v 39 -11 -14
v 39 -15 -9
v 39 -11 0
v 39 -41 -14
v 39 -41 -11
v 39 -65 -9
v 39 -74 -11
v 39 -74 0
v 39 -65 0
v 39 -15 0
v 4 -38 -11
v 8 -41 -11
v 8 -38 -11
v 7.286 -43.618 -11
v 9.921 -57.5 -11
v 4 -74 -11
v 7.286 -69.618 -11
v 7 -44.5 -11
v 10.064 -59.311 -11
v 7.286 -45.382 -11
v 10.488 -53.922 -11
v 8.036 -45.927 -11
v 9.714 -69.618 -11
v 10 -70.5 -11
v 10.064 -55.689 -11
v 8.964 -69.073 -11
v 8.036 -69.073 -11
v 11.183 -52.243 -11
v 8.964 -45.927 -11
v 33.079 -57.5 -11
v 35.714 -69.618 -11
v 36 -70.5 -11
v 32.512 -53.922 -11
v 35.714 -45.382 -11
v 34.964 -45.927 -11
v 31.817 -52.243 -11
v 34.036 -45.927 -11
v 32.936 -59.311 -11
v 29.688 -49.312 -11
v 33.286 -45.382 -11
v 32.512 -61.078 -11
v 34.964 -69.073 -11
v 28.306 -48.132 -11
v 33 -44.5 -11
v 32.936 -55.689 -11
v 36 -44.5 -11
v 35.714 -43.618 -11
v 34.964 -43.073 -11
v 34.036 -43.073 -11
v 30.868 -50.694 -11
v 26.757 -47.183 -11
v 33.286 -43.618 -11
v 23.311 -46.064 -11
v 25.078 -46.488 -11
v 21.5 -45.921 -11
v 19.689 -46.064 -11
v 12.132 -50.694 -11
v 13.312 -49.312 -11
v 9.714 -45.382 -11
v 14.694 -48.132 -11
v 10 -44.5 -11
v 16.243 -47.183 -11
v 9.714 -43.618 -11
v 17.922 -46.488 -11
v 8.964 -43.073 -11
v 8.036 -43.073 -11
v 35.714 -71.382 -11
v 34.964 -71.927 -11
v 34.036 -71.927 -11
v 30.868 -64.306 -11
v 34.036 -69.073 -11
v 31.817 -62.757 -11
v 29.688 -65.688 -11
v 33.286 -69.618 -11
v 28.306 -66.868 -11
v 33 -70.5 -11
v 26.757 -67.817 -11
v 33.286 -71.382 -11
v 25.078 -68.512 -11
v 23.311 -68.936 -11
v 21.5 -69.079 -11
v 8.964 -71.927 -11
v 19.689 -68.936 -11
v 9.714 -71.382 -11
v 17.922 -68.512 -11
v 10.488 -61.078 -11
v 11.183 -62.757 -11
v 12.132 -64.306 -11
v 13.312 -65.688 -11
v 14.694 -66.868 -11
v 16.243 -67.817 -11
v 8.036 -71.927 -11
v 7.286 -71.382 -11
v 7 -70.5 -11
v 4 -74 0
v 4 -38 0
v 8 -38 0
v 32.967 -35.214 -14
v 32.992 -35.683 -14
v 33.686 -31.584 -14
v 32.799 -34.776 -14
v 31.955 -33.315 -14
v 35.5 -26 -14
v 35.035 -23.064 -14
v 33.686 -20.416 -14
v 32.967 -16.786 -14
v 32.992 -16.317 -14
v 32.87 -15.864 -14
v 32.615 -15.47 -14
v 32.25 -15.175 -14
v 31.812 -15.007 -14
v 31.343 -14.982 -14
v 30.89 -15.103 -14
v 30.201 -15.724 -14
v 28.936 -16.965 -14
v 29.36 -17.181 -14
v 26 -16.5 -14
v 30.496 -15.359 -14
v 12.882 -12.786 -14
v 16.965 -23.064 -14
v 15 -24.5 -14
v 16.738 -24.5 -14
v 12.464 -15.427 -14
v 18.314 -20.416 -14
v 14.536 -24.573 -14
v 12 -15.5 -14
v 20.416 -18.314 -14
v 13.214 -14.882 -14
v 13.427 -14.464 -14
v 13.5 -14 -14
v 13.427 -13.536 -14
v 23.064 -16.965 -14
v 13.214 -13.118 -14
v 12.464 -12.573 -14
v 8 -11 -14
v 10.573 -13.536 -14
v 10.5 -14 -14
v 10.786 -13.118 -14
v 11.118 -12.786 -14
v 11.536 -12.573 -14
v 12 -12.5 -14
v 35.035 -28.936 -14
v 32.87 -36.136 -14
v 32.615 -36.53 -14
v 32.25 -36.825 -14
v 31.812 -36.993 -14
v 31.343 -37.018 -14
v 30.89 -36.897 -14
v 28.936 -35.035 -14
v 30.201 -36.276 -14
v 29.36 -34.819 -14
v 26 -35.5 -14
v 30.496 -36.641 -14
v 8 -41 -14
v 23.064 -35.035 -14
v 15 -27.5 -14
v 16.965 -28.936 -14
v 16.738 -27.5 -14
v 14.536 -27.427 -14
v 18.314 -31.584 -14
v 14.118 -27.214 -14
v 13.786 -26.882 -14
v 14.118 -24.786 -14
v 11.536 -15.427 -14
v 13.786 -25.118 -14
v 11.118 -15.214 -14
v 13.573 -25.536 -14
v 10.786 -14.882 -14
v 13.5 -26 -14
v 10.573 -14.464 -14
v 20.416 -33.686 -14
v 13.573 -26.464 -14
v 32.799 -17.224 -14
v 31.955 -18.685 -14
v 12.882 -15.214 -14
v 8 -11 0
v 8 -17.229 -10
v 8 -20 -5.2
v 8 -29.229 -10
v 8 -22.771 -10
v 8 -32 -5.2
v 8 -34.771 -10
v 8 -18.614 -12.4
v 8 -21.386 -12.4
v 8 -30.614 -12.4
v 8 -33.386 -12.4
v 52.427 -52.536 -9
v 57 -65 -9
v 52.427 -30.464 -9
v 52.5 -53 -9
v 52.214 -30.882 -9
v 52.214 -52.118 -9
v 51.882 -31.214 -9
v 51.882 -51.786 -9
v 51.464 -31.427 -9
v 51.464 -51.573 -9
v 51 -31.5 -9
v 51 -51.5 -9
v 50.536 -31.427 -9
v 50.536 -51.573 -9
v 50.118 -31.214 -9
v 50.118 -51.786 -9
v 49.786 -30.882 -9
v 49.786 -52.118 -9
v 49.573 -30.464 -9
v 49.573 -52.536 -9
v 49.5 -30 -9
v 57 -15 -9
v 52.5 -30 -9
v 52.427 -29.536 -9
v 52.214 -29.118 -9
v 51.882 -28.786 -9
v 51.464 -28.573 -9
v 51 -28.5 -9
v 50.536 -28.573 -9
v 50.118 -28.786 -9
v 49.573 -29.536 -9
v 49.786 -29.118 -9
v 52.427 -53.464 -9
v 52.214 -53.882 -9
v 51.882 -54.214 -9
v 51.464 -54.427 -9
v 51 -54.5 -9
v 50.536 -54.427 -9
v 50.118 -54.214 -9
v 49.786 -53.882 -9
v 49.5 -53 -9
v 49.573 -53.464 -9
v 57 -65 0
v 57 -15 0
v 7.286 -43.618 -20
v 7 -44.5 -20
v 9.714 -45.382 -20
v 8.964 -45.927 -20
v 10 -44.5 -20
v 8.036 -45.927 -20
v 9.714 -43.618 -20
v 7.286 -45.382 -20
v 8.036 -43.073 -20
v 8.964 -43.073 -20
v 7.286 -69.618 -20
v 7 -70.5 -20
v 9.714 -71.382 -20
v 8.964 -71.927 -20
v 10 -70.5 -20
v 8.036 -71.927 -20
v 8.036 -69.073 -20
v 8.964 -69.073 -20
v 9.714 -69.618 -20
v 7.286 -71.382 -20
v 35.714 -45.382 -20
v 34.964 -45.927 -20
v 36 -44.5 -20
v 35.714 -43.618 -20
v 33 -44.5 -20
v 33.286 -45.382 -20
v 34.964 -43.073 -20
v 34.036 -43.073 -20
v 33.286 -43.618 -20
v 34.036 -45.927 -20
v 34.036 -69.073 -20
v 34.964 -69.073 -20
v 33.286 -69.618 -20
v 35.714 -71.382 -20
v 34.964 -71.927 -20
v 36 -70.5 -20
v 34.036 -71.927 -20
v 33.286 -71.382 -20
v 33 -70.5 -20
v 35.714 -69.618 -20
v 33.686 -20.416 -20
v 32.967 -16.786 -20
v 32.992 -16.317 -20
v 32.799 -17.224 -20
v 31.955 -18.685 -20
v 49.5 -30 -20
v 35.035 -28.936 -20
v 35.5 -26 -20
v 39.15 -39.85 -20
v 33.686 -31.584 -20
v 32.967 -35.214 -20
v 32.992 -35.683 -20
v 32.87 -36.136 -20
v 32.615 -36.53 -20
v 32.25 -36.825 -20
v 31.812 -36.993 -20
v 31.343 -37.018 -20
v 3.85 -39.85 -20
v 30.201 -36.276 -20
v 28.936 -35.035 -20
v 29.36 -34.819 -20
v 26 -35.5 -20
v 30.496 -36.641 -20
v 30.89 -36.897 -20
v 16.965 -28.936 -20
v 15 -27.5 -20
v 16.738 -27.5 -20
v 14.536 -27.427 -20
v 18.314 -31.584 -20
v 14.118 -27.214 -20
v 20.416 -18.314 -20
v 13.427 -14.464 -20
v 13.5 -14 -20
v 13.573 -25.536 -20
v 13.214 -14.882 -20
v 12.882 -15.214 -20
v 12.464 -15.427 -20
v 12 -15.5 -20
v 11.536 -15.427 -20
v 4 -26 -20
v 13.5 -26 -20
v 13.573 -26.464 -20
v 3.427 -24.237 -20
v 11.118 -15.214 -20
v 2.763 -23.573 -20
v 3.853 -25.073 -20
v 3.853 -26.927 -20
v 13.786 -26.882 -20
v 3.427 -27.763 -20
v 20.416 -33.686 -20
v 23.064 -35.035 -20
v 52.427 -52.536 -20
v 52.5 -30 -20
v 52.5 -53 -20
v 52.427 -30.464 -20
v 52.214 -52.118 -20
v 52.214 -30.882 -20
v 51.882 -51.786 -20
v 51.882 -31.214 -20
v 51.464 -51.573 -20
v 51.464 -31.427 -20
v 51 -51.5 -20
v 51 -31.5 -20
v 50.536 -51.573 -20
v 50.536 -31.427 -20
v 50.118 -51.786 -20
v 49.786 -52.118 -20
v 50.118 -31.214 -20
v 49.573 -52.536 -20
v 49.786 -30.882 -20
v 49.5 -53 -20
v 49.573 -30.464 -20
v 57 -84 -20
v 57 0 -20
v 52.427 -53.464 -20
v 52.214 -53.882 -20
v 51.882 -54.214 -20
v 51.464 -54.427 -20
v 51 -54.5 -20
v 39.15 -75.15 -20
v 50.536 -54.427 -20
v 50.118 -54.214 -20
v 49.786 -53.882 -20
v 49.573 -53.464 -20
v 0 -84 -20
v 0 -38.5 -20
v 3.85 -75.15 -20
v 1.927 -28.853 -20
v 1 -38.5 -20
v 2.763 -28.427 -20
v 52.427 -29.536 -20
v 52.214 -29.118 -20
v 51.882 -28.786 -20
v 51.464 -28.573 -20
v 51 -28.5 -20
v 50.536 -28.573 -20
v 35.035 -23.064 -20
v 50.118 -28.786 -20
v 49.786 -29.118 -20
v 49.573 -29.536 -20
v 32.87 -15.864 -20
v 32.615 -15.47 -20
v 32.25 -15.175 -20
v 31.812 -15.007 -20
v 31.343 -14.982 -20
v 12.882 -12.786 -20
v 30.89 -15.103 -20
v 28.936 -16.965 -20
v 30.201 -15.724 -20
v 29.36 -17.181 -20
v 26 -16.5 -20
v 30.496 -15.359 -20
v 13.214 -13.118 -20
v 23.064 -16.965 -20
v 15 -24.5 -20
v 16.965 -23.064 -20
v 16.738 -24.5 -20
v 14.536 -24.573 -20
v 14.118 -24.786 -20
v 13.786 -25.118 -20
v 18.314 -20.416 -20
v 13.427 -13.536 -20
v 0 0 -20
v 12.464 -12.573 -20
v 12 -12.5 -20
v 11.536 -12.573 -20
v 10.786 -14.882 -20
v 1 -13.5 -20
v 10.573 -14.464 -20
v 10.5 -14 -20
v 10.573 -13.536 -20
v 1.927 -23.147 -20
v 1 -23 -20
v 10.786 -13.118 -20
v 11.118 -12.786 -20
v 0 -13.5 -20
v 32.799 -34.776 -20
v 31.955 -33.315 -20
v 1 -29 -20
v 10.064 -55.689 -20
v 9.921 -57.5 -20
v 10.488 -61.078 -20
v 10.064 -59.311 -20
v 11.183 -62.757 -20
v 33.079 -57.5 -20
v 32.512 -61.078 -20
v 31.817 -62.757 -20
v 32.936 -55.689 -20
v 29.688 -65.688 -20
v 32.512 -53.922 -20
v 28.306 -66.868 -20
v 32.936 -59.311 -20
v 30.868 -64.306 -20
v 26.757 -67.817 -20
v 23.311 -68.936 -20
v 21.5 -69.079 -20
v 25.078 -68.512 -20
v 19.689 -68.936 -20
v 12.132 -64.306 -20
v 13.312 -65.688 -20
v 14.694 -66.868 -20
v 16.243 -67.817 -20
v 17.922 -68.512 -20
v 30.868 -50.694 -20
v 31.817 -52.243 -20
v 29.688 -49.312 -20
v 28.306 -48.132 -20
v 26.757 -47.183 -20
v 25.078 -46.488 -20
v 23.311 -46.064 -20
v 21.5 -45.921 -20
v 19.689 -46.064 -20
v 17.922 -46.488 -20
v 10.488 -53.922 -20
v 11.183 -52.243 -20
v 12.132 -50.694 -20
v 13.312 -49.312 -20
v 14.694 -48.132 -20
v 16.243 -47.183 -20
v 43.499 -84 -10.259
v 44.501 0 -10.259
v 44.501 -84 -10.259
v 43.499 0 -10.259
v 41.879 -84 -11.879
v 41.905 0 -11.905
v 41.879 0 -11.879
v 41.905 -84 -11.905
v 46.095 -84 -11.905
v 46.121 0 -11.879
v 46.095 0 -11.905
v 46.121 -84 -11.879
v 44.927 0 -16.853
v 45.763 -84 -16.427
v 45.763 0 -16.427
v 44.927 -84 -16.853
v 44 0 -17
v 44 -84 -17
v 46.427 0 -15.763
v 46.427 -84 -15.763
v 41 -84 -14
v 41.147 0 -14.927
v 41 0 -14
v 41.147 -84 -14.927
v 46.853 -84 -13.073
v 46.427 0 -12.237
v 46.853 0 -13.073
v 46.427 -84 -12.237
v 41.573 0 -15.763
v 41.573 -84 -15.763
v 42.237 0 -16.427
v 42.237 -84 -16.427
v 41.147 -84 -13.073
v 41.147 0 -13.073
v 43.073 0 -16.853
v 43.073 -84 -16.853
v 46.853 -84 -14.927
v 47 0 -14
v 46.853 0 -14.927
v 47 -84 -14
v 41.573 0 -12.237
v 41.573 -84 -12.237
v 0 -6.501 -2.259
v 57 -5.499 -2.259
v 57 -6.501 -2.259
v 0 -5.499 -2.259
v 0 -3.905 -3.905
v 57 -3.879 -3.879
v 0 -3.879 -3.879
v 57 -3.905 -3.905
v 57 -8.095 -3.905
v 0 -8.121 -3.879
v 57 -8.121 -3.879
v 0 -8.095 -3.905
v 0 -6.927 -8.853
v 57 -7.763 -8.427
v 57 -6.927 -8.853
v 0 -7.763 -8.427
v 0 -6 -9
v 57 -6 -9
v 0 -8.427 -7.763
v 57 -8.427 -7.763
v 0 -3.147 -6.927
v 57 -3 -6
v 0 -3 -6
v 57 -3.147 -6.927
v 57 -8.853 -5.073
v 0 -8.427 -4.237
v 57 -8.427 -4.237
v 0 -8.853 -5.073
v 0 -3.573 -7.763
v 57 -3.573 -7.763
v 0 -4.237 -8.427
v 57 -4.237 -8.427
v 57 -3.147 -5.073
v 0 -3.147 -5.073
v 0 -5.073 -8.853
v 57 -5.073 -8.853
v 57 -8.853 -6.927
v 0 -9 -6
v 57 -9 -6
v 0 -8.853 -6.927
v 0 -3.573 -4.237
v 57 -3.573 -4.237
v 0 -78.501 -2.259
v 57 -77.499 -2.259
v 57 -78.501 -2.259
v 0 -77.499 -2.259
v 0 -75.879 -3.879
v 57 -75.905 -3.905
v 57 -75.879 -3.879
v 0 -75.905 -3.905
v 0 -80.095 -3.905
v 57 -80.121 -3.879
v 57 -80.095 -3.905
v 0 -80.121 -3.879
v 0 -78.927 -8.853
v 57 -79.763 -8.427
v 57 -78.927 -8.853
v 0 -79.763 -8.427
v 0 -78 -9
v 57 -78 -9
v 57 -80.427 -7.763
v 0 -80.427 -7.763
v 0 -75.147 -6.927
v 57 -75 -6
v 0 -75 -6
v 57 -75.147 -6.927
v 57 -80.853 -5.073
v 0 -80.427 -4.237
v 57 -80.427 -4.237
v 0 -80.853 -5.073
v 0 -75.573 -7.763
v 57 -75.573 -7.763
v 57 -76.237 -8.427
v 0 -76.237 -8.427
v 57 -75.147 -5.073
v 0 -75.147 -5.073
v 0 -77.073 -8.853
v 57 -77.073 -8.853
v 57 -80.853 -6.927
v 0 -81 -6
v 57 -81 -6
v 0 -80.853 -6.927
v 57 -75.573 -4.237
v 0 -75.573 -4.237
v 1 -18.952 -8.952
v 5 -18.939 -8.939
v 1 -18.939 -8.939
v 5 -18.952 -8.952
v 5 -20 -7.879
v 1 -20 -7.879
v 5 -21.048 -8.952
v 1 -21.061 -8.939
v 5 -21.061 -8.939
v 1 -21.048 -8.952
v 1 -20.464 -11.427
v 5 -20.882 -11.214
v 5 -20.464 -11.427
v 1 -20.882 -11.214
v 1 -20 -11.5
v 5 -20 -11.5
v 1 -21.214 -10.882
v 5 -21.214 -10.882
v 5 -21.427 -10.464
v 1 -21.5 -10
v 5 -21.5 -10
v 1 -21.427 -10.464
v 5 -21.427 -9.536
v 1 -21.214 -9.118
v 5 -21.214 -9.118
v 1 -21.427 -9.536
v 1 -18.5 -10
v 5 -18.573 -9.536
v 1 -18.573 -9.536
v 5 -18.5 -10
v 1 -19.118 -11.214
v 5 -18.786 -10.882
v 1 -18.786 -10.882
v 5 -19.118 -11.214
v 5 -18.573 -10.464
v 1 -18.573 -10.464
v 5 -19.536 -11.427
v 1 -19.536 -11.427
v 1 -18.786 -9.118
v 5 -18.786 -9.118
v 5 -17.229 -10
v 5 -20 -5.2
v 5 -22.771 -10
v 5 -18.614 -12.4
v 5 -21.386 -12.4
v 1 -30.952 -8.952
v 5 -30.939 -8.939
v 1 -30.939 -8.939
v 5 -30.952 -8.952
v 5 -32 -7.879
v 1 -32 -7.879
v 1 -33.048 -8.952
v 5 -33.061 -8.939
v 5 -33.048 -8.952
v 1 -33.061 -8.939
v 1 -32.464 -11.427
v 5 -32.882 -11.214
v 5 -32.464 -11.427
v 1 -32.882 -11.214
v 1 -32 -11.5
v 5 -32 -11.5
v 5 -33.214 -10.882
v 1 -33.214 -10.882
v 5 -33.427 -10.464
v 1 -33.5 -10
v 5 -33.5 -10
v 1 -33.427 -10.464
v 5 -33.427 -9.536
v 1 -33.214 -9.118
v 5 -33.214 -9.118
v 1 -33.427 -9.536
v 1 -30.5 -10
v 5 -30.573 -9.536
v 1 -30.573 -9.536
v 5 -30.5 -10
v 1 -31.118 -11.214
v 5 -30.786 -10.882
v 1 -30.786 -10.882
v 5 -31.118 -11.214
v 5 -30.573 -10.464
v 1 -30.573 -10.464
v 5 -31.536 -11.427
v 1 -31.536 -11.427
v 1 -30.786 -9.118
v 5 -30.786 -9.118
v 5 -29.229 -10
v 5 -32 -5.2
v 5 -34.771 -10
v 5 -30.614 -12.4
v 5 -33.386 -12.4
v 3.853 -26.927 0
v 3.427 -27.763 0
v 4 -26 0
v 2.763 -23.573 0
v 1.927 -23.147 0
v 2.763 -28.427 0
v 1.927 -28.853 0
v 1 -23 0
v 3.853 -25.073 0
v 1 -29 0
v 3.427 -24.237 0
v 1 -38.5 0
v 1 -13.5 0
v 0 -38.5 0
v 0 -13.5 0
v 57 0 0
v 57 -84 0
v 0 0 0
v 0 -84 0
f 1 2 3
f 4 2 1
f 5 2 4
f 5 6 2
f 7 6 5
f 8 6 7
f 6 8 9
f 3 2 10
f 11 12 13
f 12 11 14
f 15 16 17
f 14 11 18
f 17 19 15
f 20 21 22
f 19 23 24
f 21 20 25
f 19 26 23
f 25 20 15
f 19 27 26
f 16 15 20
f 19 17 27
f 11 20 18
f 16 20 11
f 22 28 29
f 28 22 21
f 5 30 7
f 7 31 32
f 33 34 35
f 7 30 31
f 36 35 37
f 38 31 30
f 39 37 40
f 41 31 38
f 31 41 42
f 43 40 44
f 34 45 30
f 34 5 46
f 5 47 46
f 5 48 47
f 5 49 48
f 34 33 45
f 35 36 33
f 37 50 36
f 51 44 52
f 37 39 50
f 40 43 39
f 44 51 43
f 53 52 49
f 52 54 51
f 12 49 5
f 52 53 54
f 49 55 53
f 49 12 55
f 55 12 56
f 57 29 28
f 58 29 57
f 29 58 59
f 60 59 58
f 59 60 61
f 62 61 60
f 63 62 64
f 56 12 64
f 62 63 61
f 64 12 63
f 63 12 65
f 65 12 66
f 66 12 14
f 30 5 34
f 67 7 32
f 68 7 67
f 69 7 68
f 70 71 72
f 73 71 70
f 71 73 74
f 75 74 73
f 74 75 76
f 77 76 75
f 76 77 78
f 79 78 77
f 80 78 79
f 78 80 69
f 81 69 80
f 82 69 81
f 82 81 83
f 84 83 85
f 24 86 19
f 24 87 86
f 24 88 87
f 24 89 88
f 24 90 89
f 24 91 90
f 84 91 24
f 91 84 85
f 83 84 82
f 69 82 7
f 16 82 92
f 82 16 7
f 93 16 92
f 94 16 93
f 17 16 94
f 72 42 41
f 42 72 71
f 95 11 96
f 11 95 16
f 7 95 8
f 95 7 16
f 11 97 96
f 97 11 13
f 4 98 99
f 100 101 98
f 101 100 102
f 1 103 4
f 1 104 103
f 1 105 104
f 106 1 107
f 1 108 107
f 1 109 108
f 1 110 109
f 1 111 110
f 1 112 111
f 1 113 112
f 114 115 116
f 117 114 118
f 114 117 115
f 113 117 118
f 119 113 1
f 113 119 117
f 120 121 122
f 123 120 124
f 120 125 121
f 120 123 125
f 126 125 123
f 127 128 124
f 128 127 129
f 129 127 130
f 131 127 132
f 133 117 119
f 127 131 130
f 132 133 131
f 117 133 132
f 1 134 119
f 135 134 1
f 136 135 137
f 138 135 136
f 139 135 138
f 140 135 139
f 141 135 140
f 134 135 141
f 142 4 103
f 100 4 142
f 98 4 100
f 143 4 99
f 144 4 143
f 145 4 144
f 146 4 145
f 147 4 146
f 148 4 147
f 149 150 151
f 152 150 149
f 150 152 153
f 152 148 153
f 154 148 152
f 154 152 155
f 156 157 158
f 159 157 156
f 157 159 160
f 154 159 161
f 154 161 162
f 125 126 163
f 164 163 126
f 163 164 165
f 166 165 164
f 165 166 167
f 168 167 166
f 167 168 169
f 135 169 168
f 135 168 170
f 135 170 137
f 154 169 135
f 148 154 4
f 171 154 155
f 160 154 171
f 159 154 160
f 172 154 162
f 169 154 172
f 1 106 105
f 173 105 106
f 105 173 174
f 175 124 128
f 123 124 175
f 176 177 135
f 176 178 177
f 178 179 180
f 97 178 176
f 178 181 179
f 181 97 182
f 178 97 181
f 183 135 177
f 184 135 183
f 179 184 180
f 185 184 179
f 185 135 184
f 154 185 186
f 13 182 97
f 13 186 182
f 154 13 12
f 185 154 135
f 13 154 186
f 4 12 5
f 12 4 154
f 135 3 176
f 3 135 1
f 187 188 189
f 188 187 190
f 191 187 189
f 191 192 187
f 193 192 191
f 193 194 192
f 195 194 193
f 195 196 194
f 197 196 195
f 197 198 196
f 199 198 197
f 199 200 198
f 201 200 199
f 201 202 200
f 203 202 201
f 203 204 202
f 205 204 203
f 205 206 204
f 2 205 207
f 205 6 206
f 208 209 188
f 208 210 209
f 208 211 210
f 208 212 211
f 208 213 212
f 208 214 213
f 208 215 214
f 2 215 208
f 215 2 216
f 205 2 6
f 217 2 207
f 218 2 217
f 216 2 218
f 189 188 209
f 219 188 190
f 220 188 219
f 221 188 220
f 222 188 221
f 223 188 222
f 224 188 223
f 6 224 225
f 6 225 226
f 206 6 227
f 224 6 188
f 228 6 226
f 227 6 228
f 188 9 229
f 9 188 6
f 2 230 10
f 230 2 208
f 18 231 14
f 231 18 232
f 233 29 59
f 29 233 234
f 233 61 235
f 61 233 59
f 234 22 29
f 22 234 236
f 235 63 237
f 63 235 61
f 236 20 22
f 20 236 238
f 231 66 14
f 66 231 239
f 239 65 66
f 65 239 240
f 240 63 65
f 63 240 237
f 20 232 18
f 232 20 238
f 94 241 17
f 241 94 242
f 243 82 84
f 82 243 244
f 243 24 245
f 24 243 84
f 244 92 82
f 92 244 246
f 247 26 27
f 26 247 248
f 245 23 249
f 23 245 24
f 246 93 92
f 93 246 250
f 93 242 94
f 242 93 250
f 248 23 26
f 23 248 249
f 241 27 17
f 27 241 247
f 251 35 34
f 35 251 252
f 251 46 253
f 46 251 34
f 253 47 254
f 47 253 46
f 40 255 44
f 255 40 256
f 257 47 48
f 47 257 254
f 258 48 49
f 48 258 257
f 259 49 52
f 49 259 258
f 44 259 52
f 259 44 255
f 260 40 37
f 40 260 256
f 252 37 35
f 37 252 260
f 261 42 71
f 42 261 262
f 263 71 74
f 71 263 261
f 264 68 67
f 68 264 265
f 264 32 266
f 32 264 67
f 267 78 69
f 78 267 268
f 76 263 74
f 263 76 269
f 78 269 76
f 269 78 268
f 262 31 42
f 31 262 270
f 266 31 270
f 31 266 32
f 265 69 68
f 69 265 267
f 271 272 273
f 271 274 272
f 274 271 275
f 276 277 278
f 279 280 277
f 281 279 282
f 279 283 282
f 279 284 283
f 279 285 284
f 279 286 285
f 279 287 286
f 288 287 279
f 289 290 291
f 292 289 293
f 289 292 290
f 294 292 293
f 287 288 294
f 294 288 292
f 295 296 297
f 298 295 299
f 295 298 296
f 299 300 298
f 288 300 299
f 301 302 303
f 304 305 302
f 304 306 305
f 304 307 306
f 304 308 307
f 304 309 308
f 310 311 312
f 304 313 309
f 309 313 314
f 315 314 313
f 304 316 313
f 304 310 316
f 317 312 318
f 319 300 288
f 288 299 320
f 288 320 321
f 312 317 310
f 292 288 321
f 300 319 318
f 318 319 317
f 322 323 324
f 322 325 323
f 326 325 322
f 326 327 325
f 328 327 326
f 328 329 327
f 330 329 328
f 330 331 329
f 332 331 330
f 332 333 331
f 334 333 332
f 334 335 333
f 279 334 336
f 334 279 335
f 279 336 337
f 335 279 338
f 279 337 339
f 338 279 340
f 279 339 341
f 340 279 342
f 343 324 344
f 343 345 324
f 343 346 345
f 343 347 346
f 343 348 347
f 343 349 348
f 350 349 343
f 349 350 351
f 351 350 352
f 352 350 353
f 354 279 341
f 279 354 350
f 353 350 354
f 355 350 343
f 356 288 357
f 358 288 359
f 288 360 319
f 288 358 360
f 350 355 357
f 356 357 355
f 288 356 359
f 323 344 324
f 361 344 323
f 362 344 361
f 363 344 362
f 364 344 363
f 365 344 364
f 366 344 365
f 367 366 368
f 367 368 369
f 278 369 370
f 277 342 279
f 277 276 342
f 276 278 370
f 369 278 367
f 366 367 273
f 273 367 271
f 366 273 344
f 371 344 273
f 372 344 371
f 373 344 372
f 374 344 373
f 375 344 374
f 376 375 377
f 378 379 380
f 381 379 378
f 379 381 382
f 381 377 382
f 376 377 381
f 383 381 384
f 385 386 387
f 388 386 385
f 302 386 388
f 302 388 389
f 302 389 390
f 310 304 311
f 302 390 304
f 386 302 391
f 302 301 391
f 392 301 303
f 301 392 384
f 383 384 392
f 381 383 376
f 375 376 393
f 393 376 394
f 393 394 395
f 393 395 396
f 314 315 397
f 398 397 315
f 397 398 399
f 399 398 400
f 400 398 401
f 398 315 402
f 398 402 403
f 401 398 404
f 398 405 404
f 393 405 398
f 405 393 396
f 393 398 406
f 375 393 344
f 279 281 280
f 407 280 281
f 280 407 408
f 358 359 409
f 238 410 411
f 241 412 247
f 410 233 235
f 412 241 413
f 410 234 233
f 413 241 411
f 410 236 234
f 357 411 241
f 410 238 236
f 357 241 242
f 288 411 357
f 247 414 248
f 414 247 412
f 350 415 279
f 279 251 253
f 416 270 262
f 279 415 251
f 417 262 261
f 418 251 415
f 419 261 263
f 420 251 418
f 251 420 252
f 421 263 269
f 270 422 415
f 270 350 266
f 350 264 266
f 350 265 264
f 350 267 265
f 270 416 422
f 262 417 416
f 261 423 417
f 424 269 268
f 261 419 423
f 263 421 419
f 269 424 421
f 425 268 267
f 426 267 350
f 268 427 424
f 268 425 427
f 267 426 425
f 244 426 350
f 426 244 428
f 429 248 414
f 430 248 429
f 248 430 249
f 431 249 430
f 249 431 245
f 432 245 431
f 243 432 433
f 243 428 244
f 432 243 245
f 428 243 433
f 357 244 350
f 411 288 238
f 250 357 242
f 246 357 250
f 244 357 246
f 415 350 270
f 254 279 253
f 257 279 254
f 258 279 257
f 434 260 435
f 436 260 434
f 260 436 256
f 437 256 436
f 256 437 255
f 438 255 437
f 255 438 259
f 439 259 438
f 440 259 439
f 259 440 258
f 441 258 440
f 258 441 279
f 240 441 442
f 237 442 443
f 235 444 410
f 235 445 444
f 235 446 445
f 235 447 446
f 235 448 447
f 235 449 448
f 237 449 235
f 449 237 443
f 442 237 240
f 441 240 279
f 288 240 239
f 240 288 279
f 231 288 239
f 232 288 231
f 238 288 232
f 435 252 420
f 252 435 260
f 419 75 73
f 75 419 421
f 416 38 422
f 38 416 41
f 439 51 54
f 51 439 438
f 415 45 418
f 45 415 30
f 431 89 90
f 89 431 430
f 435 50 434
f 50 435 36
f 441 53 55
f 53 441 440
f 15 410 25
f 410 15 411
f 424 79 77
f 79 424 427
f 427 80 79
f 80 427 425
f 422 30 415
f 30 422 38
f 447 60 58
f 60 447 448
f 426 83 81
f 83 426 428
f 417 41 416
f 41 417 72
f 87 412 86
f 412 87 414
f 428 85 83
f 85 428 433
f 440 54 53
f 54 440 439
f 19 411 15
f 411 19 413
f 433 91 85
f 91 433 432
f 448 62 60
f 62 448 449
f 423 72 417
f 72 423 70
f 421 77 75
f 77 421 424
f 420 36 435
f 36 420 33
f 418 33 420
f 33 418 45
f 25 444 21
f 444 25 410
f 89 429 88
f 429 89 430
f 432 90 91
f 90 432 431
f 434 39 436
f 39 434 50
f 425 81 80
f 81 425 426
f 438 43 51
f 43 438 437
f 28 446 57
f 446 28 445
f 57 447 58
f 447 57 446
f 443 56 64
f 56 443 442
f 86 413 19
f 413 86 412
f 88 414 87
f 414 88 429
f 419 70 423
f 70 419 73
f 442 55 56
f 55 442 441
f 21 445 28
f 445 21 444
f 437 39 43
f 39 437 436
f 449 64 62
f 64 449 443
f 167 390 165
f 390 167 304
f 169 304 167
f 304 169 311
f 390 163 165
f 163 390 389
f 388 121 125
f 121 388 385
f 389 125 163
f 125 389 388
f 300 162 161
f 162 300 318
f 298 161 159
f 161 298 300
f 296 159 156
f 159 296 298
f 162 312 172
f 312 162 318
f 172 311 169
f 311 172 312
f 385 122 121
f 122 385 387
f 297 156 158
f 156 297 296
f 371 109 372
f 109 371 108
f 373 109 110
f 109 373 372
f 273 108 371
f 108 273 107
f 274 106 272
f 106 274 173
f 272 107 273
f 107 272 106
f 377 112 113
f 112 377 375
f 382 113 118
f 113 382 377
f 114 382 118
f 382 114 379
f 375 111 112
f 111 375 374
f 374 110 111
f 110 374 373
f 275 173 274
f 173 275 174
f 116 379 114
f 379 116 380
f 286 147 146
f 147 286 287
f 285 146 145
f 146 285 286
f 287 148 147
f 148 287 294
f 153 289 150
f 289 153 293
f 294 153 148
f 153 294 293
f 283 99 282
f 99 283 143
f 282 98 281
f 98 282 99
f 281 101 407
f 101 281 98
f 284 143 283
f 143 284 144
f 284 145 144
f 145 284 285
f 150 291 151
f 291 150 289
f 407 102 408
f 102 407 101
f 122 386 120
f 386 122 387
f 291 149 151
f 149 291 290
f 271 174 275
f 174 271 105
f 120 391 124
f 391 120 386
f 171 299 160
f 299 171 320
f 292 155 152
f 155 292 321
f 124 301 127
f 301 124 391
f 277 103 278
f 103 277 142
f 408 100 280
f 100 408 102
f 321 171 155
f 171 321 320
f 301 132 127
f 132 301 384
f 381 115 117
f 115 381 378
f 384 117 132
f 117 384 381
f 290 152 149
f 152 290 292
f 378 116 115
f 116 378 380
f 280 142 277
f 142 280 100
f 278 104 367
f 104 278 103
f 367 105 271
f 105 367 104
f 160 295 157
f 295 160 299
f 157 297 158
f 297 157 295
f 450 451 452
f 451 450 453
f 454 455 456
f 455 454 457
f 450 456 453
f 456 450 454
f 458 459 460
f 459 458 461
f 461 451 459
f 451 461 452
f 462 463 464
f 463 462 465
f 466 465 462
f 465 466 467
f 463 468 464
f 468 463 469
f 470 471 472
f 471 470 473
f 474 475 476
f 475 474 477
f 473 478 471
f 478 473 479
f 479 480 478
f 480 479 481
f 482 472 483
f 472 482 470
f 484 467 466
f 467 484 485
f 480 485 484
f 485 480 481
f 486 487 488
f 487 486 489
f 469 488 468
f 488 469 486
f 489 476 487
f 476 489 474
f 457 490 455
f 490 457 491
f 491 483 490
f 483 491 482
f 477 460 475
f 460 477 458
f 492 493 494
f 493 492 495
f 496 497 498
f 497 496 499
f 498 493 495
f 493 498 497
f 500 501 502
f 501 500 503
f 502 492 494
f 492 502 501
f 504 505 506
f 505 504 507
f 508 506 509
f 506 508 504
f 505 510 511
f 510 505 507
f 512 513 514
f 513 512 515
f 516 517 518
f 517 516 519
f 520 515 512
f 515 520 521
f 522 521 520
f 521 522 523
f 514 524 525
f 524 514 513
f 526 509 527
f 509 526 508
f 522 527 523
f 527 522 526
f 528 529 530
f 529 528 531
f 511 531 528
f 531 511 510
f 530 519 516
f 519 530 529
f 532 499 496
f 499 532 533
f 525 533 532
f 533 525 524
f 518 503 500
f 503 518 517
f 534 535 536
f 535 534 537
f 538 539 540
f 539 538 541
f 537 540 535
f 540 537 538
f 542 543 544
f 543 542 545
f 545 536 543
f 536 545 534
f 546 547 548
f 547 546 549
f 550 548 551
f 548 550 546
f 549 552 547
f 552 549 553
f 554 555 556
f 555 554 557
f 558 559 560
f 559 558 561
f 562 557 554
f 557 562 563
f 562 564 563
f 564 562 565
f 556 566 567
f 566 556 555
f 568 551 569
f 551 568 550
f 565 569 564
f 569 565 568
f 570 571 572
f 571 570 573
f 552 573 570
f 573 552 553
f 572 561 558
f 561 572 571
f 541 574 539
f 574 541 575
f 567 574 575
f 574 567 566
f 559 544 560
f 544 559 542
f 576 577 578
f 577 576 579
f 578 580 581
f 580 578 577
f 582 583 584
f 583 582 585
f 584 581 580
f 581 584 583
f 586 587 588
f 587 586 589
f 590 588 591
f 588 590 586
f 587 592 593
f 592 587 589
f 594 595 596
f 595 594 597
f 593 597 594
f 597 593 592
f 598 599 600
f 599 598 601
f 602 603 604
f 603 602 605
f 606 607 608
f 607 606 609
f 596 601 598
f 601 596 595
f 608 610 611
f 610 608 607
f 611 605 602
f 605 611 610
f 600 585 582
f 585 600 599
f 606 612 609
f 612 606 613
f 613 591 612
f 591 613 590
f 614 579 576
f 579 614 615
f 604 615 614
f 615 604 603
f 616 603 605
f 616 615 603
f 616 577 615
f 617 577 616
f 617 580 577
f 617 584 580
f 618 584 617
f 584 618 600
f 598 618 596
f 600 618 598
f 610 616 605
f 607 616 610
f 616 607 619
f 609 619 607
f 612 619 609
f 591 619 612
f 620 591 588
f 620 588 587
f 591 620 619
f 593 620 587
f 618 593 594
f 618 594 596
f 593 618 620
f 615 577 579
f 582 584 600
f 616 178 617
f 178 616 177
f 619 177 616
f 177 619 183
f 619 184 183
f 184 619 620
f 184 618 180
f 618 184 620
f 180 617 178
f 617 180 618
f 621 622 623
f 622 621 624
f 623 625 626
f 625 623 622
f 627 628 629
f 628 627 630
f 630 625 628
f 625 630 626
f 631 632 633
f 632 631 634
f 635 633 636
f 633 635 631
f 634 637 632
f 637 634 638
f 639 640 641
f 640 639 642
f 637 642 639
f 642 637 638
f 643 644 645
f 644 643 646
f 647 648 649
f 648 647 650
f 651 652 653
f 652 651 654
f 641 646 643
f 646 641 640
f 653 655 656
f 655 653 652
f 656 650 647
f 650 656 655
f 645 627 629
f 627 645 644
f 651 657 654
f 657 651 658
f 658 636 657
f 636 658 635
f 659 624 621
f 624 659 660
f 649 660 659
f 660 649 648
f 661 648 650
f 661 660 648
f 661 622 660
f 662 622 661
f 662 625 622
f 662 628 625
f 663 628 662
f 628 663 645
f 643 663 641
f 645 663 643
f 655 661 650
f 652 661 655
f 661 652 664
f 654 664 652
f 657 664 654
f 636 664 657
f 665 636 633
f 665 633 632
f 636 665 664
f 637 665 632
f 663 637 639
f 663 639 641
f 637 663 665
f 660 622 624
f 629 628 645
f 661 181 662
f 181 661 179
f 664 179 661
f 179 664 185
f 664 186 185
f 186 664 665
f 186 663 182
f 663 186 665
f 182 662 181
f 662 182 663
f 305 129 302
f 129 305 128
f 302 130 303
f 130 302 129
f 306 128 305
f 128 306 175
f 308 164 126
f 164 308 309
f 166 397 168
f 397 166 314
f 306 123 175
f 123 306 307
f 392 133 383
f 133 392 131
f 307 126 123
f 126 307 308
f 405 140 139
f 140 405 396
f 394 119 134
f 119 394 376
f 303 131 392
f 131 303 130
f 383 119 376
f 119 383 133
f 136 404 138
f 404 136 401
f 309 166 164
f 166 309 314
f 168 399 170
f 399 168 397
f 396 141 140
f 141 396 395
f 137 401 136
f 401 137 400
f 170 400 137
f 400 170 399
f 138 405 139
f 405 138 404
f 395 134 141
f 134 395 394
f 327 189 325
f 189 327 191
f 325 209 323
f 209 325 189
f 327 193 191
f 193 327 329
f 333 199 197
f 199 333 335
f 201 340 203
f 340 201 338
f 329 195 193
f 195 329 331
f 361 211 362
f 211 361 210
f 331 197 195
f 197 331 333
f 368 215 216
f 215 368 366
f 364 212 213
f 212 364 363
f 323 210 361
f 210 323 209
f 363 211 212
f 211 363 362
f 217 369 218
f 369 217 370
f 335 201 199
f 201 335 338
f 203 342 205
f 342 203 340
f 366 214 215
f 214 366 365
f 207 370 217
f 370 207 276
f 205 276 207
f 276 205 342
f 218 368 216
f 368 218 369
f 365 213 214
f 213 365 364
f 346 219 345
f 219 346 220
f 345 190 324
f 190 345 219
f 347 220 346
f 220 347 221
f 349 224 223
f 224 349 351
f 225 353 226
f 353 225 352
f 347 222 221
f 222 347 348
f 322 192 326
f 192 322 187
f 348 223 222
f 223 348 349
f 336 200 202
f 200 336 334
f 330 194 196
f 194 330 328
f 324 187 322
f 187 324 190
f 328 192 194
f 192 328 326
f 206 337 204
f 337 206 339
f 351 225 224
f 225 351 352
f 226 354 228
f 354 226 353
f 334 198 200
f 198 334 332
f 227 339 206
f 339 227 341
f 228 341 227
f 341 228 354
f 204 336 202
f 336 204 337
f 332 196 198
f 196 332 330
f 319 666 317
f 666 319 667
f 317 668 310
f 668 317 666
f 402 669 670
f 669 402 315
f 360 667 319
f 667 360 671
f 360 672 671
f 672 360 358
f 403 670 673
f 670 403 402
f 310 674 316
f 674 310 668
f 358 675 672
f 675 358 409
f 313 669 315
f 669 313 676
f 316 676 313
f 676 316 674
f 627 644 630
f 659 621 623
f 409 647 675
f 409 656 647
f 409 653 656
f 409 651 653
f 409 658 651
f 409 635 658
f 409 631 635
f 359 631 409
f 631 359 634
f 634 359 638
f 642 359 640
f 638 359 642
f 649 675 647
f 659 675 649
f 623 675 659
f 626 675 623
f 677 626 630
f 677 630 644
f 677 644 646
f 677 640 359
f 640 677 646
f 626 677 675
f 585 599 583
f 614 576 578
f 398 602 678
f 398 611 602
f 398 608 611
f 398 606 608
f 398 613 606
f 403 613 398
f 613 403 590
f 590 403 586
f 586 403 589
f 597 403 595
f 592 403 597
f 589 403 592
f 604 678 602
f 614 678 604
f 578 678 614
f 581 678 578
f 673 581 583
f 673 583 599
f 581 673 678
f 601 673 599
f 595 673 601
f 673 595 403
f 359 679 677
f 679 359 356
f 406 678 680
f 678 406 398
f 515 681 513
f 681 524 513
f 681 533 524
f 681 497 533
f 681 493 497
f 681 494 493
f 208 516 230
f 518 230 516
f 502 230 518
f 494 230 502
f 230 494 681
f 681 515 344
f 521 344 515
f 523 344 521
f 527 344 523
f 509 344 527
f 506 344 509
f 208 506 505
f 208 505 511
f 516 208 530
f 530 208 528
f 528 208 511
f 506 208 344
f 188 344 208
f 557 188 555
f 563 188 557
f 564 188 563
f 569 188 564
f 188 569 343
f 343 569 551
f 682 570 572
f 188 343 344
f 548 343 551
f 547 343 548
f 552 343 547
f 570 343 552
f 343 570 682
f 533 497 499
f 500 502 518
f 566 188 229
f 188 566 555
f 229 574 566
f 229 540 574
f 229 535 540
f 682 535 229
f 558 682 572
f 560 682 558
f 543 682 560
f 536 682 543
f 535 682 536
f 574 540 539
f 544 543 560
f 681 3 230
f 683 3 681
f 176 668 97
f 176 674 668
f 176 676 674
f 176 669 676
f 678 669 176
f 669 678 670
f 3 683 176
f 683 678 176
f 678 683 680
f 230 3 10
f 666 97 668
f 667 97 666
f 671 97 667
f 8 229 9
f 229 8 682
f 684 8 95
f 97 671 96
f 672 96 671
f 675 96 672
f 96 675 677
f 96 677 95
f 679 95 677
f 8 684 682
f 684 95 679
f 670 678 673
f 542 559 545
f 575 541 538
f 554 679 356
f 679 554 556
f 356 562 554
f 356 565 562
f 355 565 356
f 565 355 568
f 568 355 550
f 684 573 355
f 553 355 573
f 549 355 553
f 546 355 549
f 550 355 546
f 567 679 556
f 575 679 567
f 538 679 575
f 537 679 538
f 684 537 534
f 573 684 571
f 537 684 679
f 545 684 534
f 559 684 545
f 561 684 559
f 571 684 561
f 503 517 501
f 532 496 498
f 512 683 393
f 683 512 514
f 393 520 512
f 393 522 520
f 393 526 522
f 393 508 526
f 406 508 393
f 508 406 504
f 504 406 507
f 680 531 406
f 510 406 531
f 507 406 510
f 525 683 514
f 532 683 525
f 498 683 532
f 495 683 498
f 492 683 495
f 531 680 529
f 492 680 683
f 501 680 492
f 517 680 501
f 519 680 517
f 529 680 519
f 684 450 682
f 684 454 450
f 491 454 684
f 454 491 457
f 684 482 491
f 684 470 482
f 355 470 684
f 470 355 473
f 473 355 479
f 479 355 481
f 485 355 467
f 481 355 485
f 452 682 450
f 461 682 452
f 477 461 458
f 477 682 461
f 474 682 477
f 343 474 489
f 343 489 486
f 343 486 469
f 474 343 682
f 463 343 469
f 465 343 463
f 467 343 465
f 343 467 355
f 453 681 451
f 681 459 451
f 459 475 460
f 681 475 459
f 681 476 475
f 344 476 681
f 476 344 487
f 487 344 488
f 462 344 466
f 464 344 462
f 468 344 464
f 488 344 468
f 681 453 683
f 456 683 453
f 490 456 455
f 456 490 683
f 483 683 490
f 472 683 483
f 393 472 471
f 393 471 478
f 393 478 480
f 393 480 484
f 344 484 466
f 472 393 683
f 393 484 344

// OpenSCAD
// file: library.scad
include <parameters.scad>;


// inner and outer product.  Why aren't these standard?!!!?

function ip(v1 = [0,0,0], v2 = [0,0,0]) = v1.x*v2.x + v1.y*v2.y + v1.z*v2.z;

function op(v1 = [0,0,0], v2 = [0,0,0]) = [v1.y*v2.z - v1.z*v2.y, v1.z*v2.x - v1.x*v2.z, v1.x*v2.y - v1.y*v2.x];

module nema14()
{
	color([1,0.4,0.4,1])
	union()
	{
		translate([0, 0, nema14_shaft_length/2 - nema14_shaft_projection - nema14_hub_depth])
			cylinder(r = nema14_shaft/2, h = nema14_shaft_length, center = true, $fn=20);
		translate([0, 0, -nema14_hub_depth])
			cylinder(r = nema14_hub/2, h = nema14_hub_depth*2, center = true, $fn=20);
		translate([0, 0, nema14_length/2])
			cube([nema14_square,nema14_square,nema14_length], center = true);
		union()
		{
			for ( x = [0:1] ) 
			for ( y = [0:1] )
			{
				translate([(x-0.5)*nema14_screws, (y-0.5)*nema14_screws, 0])
					cylinder(r = screwsize/2, h = 30, center = true, $fn=10);
			}
		}
	}


}

// Pentagon nut that matches a hexagon...

module pentanut(height=40)
{
	rotate([0,0,60])
	intersection()
	{
		translate([-nutsize,-nutsize*5,-20])
			cube([nutsize*10, nutsize*10,height]);
		rotate([0,0,60])
			translate([-nutsize,-nutsize*5,-20])
				cube([nutsize*10, nutsize*10,height]);
		rotate([0,0,120])
			translate([-nutsize,-nutsize*5,-20])
				cube([nutsize*10, nutsize*10,height]);
		rotate([0,0,180])
			translate([-nutsize,-nutsize*5,-20])
				cube([nutsize*10, nutsize*10,height]);
		rotate([0,0,240])
			translate([-nutsize,-nutsize*5,-20])
				cube([nutsize*10, nutsize*10,height]);
	}
}


// Make a RepRap teardrop with its axis along Z
// If truncated is true, chop the apex; if not, come to a point

// I stole this function from Erik...


module teardrop(radius, height, truncateMM)
{
	union()
	{
		if(truncateMM > 0)
		{
			intersection()
			{
				translate([truncateMM,0,height/2]) 
					scale([1,1,height])
						cube([radius*2.8275,radius*2,1],center=true);
				scale([1,1,height]) 
						rotate([0,0,3*45])
							cube([radius,radius,1]);
			}
		} else
		{
			scale([1,1,height])
				rotate([0,0,3*45])
					cube([radius,radius,1]);
		}
		cylinder(r=radius, h = height, $fn=20);
	}
}


// Make a ball-bearing holder cutout

module bearing_holder(radius = 6.5)
{
	union()
	{
		cylinder (h = radius*5, r = radius, center = true, $fn = 20);
		for(i=[0:2])
		{
			rotate([0,0,120*i])
				translate([radius+screwsize/2, 0, 0])
					union()
					{
						cylinder (h = radius*5, r = screwsize/2, center = true, $fn = 20);
						translate([-screwsize, 0, 0])
							cube([2*screwsize, screwsize, radius*5], center = true);
					}
		}
	}
}

// Make a cuboid with a 45 degree top for vertical slots etc

module cen_hat(size)
{
	translate([0, 0, size.x/sqrt(2)])
		union()
		{
			rotate([0, 45, 0])
				cube([size.x, size.y, 5*max(size.x, max(size.y, size.z))], center=true);
			rotate([0, -45, 0])
				cube([size.x, size.y, 5*max(size.x, max(size.y, size.z))], center=true);
		}
}

module hat_cube(size = [1,1,1], center = false)
{
	difference()
	{
		cube(size, center);
		if(center)
			translate([0, 0, size.z/2])
				cen_hat(size);
		else
			translate([size.x/2, size.y/2, size.z])
				cen_hat(size);
	}
}



module rod(length, threaded) if (threaded && renderrodthreads) {
	linear_extrude(height = length, center = true, convexity = 10, twist = -360 * length / rodpitch, $fn = fn)
		translate([rodsize * 0.1 / 2, 0, 0])
			circle(r = rodsize * 0.9 / 2, $fn = fn);
} else cylinder(h = length, r = rodsize / 2, center = true, $fn = fn);


module rodnut(position, washer) render() translate([0, 0, position]) {
	intersection() {
		scale([1, 1, 0.5]) sphere(r = 1.05 * rodsize, center = true);
		difference() {
			cylinder (h = rodnutsize, r = rodnutdiameter / 2, center = true, $fn = 6);
			rod(rodnutsize + 0.1);
		}
	}
	if (washer == 1 || washer == 4) rodwasher(((position > 0) ? -1 : 1) * (rodnutsize + rodwashersize) / 2);
	if (washer == 2 || washer == 4) rodwasher(((position > 0) ? 1 : -1) * (rodnutsize + rodwashersize) / 2);
}


module rodwasher(position) render() translate ([0, 0, position]) difference() {
	cylinder(r = rodwasherdiameter / 2, h = rodwashersize, center = true, $fn = fn);
	rod(rodwashersize + 0.1);
}


module screw(length, nutpos, washer, bearingpos = -1) union(){
	translate([0, 0, -length / 2]) if (renderscrewthreads) {
		linear_extrude(height = length, center = true, convexity = 10, twist = -360 * length / screwpitch, $fn = fn)
			translate([screwsize * 0.1 / 2, 0, 0])
				circle(r = screwsize * 0.9 / 2, $fn = fn);
	} else cylinder(h = length, r = screwsize / 2, center = true, $fn = fn);
	render() difference() {
		translate([0, 0, screwsize / 2]) cylinder(h = screwsize, r = screwsize, center = true, $fn = fn);
		translate([0, 0, screwsize]) cylinder(h = screwsize, r = screwsize / 2, center = true, $fn = 6);
	}
	if (washer > 0 && nutpos > 0) {
		washer(nutpos);
		nut(nutpos + washersize);
	} else if (nutpos > 0) nut(nutpos);
	if (bearingpos >= 0) bearing(bearingpos);
}


module bearing(position) render() translate([0, 0, -position - bearingwidth / 2]) union() {
	difference() {
		cylinder(h = bearingwidth, r = bearingsize / 2, center = true, $fn = fn);
		cylinder(h = bearingwidth * 2, r = bearingsize / 2 - 1, center = true, $fn = fn);
	}
	difference() {
		cylinder(h = bearingwidth - 0.5, r = bearingsize / 2 - 0.5, center = true, $fn = fn);
		cylinder(h = bearingwidth * 2, r = screwsize / 2 + 0.5, center = true, $fn = fn);
	}
	difference() {
		cylinder(h = bearingwidth, r = screwsize / 2 + 1, center = true, $fn = fn);
		cylinder(h = bearingwidth + 0.1, r = screwsize / 2, center = true, $fn = fn);
	}
}


module nut(position, washer) render() translate([0, 0, -position - nutsize / 2]) {
	intersection() {
		scale([1, 1, 0.5]) sphere(r = 1.05 * screwsize, center = true);
		difference() {
			cylinder (h = nutsize, r = nutdiameter / 2, center = true, $fn = 6);
			cylinder(r = screwsize / 2, h = nutsize + 0.1, center = true, $fn = fn);
		}
	}
	if (washer > 0) washer(0);
}


module washer(position) render() translate ([0, 0, -position - washersize / 2]) difference() {
	cylinder(r = washerdiameter / 2, h = washersize, center = true, $fn = fn);
	cylinder(r = screwsize / 2, h = washersize + 0.1, center = true, $fn = fn);
}


//rod(20);
//translate([rodsize * 2.5, 0, 0]) rod(20, true);
//translate([rodsize * 5, 0, 0]) screw(10, true);
//translate([rodsize * 7.5, 0, 0]) bearing();
//translate([rodsize * 10, 0, 0]) rodnut();
//translate([rodsize * 12.5, 0, 0]) rodwasher();
//translate([rodsize * 15, 0, 0]) nut();
//translate([rodsize * 17.5, 0, 0]) washer();

//hat_cube(size=[2,40,2], center=false);

//bearing_holder();

pentanut();
// file: parameters.scad
// Parameters file for RepRap Huxley

pi=3.14159265;

// The relative location in your file system where the .dxf files are
// DXFs are for quick development.  They should be replaced by parameterised CSG in dure course.

fileroot="DXF-files/";

rodsize = 6;	//threaded/smooth rod diameter in mm
xaxis = 182.5;	//width of base in mm
yaxis = 266.5;	//length of base in mm


screwsize = 3;	//bearing bore/screw diameter in mm
bearingsize = 10;	//outer diameter of bearings in mm
bearingwidth = 4;	//width of bearings in mm


rodpitch = rodsize / 6;
rodnutsize = 0.8 * rodsize;
rodnutdiameter = 1.9 * rodsize;
rodwashersize = 0.2 * rodsize;
rodwasherdiameter = 2 * rodsize;
screwpitch = screwsize / 6;
nutsize = 0.8 * screwsize;
nutdiameter = 1.9 * screwsize;
washersize = 0.2 * screwsize;
washerdiameter = 2 * screwsize;
partthick = 2 * rodsize;
vertexrodspace = 2 * rodsize;


c = [0.3, 0.3, 0.3];
rodendoffset = rodnutsize + rodwashersize * 2 + partthick / 2;
vertexoffset = vertexrodspace + rodendoffset;


renderrodthreads = false;
renderscrewthreads = false;
fn = 36;

// The gap between the joining rods at a vertex

vertex_radius=sqrt(rodsize*rodsize + vertexoffset*vertexoffset);
vertex_ang = atan(vertexoffset/rodsize)-30;
vertex_gap = 2*vertex_radius*cos(vertex_ang);

// Nema 14 dimensions - these are absolute

nema14_square=35.3;
nema14_screws=26;
nema14_hub=22;
nema14_hub_depth=2;
nema14_length=36;
nema14_shaft=5;
nema14_shaft_length=66;
nema14_shaft_projection=19;

// The RepRap slide bearings

bearing_mount_centres=18;
bearing_width=7;

// X axis parameters - many should be relative

motor_center_y = 26;
bar_clamp_x=5;
bar_clamp_y=8;
bar_clamp_x_gap=23;
bearing_y=50;
bearing_x=bar_clamp_x_gap + 10;
hole_land=4;
thickness=5;
bearing_low_z = 8;
bearing_z_gap = 25;
bearing_plate_width = bearing_mount_centres+2*hole_land + 10;
bearing_plate_overlap=0.5;
bearing_plate_support=10;
// main file
include <parameters.scad>;
use <library.scad>;

zax= 57;
zay = 84;
zaz=20;

//import_stl("../z-leadscrew-base-motor_2.stl", convexity = 7);


module z_axis_motor_base()
{
mirror([0,1,0])
	mirror([0,0,1])
		difference()
		{
			// Starting block

			cube([zax,zay,zaz]);

			// Holes in it - colour them so we can distinguish them

			color([0.4,0.4,1,1])
			{

// Body cavity

				translate([0,0,-1])
				{
					translate([4,38,-3])
						cube([35,36,15]);
					translate([8,11,0])
						cube([31,30,15]);
					//translate([39,44,0])
						//cube([12,30,15]);
					//translate([39,20,0])
						//cube([12,13,15]);
					translate([25,15,-5])
						cube([40,50,15]);
				}
				
// Motor holes

				translate([21.5,57.5,20])
				{
					cylinder(r=nema14_hub/1.9,h=zay,center=true,$fn=40);
					nema14();
				}



				
// The bearing holder

				translate([26,26,0])
					rotate([0,0,180])
						bearing_holder(radius=9.5);
				
// Vertical M3 screw holes

				translate([12,14,0])
					cylinder(r=screwsize/2,h=zay,center=true,$fn=20);
				translate([51,30,0])
					cylinder(r=screwsize/2,h=zay,center=true,$fn=20);
				translate([51,53,0])
					cylinder(r=screwsize/2,h=zay,center=true,$fn=20); 

// The Z rod notch

				translate([1,26,0])
					cylinder(r=rodsize/2,h=zay,center=true,$fn=20); 
				
// The M6 rod in the triangle frame

				translate([44,-10,14])
					rotate([0,-90,0])
						rotate([-90,0,0])
							teardrop(radius=rodsize/2,height=zay*2,truncateMM=0.5);
		
// The M6 strengthening rods that run across
		
				translate([zax+10,6,6])
					rotate([0,-90,0])
						teardrop(radius=rodsize/2,height=zay*2,truncateMM=0.5);
				
				translate([zax+10,78,6])
					rotate([0,-90,0])
						teardrop(radius=rodsize/2,height=zay*2,truncateMM=0.5);
				
//  Z-rod clamp M3 holes

				translate([20,20,10])
					rotate([0,-90,0])
					{
						teardrop(radius=screwsize/2,height=zay*2,truncateMM=0);
						translate([0,0,25])
						pentanut(10);
					}
				
				translate([20,32,10])
					rotate([0,-90,0])
					{
						teardrop(radius=screwsize/2,height=zay*2,truncateMM=0);
						translate([0,0,25])
						pentanut(10);
					}
				
// Z clamp notch

				translate([0,26,10])
					cube([2,25,40], center=true);
			}
		}
}

z_axis_motor_base();
